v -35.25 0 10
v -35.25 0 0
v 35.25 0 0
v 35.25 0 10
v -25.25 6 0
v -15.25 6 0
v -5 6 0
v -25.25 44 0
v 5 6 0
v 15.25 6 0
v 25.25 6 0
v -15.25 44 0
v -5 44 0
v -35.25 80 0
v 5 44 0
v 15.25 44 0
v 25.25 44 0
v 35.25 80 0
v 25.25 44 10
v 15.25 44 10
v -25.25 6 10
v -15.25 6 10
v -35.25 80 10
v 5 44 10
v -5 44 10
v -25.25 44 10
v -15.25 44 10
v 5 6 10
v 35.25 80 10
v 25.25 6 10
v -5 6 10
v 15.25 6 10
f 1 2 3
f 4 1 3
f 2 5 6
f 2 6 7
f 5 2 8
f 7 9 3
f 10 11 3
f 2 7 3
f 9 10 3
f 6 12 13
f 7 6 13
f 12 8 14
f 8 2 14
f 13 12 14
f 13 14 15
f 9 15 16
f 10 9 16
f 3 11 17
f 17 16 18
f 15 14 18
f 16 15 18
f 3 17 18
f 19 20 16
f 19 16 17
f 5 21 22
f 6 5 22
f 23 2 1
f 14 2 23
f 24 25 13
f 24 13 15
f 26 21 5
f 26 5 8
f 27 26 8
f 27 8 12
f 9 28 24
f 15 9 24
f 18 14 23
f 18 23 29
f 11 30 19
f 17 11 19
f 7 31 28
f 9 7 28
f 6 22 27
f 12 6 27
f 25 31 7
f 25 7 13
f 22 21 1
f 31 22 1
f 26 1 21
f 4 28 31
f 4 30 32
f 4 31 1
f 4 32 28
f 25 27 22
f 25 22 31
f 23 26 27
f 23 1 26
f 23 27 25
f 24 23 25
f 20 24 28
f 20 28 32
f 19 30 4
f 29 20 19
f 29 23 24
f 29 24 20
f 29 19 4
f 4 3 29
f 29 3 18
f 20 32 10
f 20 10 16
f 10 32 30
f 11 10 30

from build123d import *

# Parameters (mm, degrees)
SKETCH2_W           = 70.5
SKETCH2_H           = 80
BOSS_EXTRUDE1_DEPTH = 10
SKETCH5_W           = 10
SKETCH5_H           = 68
CUT_EXTRUDE2_DEPTH  = 10
SKETCH8_W           = 50.5
SKETCH8_H           = 30
BOSS_EXTRUDE3_DEPTH = 10


with BuildPart() as part:
    # Sketch2 → Boss-Extrude1 (new body)
    with BuildSketch(Plane.XY):
        with Locations((0, 40)):
            Rectangle(SKETCH2_W, SKETCH2_H)
    extrude(amount=BOSS_EXTRUDE1_DEPTH)

    # Sketch5 → Cut-Extrude2 (cut)
    with BuildSketch(Plane.XY.offset(10)):
        with Locations((20.25, 40)):
            Rectangle(SKETCH5_W, SKETCH5_H)
        with Locations((-20.25, 40)):
            Rectangle(SKETCH5_W, SKETCH5_H)
        with Locations((0, 40)):
            Rectangle(SKETCH5_W, SKETCH5_H)
    extrude(amount=-CUT_EXTRUDE2_DEPTH, mode=Mode.SUBTRACT)

    # Sketch8 → Boss-Extrude3 (add)
    with BuildSketch(Plane.XY.offset(10)):
        with Locations((0, 59)):
            Rectangle(SKETCH8_W, SKETCH8_H)
    extrude(amount=-BOSS_EXTRUDE3_DEPTH)


solid = part.part
